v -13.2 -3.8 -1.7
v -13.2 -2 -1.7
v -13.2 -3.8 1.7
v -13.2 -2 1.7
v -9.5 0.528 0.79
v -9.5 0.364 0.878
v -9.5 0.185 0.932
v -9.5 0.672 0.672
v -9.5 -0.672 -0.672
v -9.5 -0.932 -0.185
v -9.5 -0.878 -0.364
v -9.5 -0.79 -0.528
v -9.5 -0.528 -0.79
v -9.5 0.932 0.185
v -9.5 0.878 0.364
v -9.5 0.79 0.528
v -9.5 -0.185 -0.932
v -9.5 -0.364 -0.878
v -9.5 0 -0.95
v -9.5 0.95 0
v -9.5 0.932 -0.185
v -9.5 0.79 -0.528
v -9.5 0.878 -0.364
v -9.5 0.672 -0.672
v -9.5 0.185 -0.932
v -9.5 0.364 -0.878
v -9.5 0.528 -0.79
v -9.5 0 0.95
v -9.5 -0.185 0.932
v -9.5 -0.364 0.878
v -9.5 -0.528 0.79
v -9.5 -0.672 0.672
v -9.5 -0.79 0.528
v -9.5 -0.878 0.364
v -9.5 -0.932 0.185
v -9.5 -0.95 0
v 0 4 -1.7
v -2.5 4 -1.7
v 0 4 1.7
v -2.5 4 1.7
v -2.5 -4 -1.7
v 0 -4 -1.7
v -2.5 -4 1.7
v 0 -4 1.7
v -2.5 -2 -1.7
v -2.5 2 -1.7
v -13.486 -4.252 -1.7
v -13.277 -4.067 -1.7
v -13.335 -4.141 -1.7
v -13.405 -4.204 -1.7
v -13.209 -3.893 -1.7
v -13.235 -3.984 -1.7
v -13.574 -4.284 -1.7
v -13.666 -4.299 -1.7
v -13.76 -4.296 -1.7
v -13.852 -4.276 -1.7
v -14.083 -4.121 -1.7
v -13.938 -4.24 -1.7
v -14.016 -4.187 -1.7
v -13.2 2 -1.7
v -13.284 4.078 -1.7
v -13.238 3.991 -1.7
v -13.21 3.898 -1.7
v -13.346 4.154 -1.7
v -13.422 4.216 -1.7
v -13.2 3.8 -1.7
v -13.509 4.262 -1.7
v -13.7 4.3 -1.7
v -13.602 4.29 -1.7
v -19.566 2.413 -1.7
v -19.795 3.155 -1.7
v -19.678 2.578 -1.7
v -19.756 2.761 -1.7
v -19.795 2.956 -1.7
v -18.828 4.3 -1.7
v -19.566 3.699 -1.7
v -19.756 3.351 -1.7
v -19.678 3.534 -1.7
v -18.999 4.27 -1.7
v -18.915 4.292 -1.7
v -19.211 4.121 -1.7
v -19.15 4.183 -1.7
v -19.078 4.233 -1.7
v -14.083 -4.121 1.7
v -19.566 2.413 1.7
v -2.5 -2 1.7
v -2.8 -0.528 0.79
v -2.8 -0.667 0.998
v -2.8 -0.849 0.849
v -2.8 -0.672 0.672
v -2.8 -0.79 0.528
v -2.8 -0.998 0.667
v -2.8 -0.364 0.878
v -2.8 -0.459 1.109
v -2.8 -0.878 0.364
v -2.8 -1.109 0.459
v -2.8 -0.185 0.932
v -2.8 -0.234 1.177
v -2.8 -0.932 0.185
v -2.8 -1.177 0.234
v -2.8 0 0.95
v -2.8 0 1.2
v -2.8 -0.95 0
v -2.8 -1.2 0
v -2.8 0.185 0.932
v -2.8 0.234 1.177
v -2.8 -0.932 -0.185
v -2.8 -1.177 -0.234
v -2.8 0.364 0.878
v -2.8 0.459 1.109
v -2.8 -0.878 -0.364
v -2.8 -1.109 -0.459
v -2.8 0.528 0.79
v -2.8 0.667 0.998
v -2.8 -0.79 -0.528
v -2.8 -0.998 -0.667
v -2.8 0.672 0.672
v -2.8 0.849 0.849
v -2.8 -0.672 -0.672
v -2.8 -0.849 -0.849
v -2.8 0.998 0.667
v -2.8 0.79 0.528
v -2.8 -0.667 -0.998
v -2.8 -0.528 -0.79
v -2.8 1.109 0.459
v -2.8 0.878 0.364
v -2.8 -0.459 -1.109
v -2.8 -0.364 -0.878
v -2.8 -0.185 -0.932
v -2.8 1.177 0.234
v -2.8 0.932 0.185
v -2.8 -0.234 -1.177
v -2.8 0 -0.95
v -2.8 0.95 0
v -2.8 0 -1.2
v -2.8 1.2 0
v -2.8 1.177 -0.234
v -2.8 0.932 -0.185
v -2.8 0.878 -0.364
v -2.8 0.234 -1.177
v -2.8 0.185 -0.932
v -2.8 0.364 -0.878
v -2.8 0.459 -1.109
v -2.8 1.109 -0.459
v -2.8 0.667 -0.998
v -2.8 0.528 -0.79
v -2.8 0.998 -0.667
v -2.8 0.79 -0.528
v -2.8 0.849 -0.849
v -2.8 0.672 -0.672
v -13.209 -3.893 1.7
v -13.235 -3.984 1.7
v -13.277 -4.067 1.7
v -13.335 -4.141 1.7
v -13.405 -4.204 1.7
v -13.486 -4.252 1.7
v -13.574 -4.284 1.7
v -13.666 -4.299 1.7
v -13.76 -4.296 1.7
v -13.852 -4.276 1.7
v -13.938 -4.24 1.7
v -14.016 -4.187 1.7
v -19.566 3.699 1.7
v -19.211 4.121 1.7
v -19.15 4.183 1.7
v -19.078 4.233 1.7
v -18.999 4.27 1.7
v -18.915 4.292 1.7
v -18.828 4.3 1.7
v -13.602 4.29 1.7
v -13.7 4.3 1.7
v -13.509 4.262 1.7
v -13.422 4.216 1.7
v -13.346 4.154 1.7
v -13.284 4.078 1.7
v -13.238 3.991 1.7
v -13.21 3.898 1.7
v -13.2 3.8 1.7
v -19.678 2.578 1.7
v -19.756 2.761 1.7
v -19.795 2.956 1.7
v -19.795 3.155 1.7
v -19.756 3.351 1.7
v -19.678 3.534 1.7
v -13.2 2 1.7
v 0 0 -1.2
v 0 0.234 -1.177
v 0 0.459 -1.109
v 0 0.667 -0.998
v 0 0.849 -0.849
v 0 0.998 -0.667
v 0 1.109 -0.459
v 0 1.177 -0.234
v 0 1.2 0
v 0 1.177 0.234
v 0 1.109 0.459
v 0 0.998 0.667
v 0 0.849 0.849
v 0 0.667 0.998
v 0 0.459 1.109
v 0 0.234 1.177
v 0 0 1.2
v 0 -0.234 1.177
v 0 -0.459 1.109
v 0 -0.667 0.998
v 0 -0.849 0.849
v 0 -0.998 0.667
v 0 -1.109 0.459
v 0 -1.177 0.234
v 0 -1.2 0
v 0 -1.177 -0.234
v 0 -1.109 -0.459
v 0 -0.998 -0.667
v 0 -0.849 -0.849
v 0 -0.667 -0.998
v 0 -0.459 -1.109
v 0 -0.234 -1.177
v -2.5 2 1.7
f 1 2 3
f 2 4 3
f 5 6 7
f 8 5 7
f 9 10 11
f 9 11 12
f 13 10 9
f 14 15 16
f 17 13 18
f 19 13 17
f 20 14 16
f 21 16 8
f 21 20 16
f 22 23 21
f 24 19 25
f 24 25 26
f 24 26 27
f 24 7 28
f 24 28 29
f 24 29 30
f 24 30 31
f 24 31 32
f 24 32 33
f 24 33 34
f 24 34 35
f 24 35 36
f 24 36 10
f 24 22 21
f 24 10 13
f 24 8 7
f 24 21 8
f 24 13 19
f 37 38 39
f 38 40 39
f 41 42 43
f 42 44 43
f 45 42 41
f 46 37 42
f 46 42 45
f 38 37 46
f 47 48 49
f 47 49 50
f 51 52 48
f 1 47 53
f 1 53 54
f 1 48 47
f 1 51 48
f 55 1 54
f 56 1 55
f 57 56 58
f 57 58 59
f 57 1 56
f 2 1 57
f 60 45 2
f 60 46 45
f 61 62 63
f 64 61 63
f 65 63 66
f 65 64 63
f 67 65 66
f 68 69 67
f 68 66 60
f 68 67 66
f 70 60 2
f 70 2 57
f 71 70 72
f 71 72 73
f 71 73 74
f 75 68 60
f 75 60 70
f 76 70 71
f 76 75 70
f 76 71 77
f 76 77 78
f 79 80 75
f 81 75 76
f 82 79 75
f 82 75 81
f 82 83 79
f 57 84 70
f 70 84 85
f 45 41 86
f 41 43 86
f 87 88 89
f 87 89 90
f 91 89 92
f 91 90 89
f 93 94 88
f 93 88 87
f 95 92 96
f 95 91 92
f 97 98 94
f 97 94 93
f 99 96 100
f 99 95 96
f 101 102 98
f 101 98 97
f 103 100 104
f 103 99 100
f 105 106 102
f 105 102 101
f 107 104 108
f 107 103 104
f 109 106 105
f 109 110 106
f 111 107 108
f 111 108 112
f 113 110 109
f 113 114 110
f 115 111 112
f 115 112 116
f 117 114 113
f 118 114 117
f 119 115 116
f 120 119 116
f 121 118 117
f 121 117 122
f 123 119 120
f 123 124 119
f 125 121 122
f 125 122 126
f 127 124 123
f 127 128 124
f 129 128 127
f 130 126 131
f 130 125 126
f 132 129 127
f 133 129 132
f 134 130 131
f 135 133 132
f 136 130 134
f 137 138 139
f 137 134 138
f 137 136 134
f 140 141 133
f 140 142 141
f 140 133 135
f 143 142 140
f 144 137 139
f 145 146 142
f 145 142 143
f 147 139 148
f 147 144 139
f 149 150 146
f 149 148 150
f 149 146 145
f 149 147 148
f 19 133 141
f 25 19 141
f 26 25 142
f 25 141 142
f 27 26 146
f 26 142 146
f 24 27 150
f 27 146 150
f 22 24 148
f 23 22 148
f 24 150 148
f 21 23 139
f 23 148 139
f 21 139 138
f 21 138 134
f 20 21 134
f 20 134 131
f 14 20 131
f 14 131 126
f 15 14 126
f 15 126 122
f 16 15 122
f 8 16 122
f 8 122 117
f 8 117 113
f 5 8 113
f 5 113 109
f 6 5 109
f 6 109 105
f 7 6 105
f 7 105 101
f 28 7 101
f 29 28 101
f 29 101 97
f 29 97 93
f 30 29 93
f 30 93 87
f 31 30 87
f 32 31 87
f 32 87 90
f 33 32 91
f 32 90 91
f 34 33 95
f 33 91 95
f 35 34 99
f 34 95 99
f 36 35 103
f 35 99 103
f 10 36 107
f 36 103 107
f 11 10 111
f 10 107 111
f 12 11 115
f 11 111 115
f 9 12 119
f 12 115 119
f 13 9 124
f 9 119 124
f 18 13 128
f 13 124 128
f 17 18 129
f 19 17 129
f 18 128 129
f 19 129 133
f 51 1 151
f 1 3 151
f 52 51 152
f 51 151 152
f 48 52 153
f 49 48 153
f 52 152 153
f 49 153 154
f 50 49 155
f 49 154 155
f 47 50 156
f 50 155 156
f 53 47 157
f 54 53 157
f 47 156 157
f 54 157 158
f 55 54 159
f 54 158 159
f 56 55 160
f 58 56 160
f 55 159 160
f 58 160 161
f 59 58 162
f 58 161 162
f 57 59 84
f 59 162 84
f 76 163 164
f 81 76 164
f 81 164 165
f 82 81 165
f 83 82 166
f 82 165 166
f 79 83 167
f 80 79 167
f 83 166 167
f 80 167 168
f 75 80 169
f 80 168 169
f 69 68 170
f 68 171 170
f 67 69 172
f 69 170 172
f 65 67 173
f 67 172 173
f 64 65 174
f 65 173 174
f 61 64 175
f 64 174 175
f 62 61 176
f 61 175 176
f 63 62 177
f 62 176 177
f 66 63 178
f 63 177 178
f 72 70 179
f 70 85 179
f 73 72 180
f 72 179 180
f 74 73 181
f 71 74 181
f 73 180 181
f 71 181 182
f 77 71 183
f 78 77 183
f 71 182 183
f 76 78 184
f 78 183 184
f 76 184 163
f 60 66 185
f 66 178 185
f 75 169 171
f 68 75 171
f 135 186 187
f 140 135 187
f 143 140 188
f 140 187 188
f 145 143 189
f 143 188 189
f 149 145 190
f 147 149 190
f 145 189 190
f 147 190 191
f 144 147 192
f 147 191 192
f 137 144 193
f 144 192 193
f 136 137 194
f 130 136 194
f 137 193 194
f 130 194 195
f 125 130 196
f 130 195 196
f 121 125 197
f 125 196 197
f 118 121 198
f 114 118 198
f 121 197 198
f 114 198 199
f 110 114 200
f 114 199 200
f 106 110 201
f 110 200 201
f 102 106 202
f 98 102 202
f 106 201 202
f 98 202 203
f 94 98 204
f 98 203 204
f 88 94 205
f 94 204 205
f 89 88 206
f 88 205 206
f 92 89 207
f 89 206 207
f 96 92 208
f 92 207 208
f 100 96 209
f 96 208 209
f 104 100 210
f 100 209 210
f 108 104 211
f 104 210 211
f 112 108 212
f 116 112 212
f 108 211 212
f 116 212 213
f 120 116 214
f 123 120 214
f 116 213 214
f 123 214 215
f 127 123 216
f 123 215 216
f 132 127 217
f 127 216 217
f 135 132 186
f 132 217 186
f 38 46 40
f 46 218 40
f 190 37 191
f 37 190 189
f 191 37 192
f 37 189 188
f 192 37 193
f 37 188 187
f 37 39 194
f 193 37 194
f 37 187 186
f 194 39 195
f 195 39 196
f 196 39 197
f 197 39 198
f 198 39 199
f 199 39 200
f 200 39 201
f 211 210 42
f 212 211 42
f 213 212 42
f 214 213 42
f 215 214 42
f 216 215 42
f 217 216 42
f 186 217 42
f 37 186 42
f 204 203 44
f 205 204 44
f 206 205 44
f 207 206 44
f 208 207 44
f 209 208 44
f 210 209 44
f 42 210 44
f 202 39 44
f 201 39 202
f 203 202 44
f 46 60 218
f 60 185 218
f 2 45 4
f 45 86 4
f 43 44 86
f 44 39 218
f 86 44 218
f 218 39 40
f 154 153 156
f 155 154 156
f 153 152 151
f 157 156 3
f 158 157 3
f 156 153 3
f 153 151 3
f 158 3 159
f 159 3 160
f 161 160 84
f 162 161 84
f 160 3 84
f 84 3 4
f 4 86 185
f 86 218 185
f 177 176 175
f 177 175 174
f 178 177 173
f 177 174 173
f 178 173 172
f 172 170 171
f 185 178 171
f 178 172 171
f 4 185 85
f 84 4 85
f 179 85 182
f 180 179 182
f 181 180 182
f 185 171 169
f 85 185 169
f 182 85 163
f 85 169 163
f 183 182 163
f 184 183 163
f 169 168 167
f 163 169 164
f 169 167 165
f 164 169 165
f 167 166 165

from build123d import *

# Parameters (mm, degrees)
BOSS_EXTRUDE3_DEPTH = 1.7
SKETCH3_R           = 0.95
CUT_EXTRUDE1_DEPTH  = 9.5
SKETCH4_R           = 1.2
CUT_EXTRUDE2_DEPTH  = 2.8


with BuildPart() as part:
    # Sketch2 → Boss-Extrude3 (new body, symmetric)
    with BuildSketch(Plane.XY):
        with BuildLine():
            Line((-18.828250092, 4.3), (-13.7, 4.3))
            ThreePointArc((-13.7, 4.3), (-13.346446609, 4.153553391), (-13.2, 3.8))
            Line((-13.2, 3.8), (-13.2, 2))
            Line((-13.2, 2), (-2.5, 2))
            Line((-2.5, 2), (-2.5, 4))
            Line((-2.5, 4), (0, 4))
            Line((0, 4), (0, -4))
            Line((0, -4), (-2.5, -4))
            Line((-2.5, -4), (-2.5, -2))
            Line((-2.5, -2), (-13.2, -2))
            Line((-13.2, -2), (-13.2, -3.8))
            ThreePointArc((-13.2, -3.8), (-13.528989928, -4.26984631), (-14.083022222, -4.121393805))
            Line((-14.083022222, -4.121393805), (-19.566044443, 2.413017626))
            ThreePointArc((-19.566044443, 2.413017626), (-19.8, 3.055805236), (-19.566044443, 3.698592845))
            Line((-19.566044443, 3.698592845), (-19.211272314, 4.121393805))
            ThreePointArc((-19.211272314, 4.121393805), (-19.039559223, 4.253153894), (-18.828250092, 4.3))
        make_face()
    extrude(amount=BOSS_EXTRUDE3_DEPTH, both=True)

    # Sketch3 → Cut-Extrude1 (cut)
    with BuildSketch(Plane(origin=(0, 0, 0), x_dir=(0, 0, -1), z_dir=(1, 0, 0))):
        Circle(SKETCH3_R)
    extrude(amount=-CUT_EXTRUDE1_DEPTH, mode=Mode.SUBTRACT)

    # Sketch4 → Cut-Extrude2 (cut)
    with BuildSketch(Plane(origin=(0, 0, 0), x_dir=(0, 0, -1), z_dir=(1, 0, 0))):
        Circle(SKETCH4_R)
    extrude(amount=-CUT_EXTRUDE2_DEPTH, mode=Mode.SUBTRACT)


solid = part.part
